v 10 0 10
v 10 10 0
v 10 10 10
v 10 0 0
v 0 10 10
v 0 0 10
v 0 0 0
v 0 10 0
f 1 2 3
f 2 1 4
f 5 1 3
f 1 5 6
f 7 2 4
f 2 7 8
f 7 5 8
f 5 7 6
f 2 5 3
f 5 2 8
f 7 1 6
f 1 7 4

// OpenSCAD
// Set viewport
$vpt=[0,0,0];
$vpr = [58, 0, 138];
$vpd = 70;

// working with 25 FPS and 100 steps
move = $t*5;
echo(move);

// side-length of cube
length = 10;

// move to origin
translate([length/2, length/2, length/2]){
    // blue origin position
    color([0,0,1]) rotate([0,0,0]) translate([0,0,0]) cube(length,true);
    // red translated and rotated position
    color([1,0,0,0.9]) rotate([move,move,move]) translate([-move,move,move]) cube(length,true);
    // arrow
    translate([5,-5,-8]) rotate([90,0,90]) text("<-------->", 2);
    // text annotation
    translate([5,-3.5,-10]) rotate([90,0,90]) text("10 cm", 2);
}

// to export check "Dump Images" on the animation view
